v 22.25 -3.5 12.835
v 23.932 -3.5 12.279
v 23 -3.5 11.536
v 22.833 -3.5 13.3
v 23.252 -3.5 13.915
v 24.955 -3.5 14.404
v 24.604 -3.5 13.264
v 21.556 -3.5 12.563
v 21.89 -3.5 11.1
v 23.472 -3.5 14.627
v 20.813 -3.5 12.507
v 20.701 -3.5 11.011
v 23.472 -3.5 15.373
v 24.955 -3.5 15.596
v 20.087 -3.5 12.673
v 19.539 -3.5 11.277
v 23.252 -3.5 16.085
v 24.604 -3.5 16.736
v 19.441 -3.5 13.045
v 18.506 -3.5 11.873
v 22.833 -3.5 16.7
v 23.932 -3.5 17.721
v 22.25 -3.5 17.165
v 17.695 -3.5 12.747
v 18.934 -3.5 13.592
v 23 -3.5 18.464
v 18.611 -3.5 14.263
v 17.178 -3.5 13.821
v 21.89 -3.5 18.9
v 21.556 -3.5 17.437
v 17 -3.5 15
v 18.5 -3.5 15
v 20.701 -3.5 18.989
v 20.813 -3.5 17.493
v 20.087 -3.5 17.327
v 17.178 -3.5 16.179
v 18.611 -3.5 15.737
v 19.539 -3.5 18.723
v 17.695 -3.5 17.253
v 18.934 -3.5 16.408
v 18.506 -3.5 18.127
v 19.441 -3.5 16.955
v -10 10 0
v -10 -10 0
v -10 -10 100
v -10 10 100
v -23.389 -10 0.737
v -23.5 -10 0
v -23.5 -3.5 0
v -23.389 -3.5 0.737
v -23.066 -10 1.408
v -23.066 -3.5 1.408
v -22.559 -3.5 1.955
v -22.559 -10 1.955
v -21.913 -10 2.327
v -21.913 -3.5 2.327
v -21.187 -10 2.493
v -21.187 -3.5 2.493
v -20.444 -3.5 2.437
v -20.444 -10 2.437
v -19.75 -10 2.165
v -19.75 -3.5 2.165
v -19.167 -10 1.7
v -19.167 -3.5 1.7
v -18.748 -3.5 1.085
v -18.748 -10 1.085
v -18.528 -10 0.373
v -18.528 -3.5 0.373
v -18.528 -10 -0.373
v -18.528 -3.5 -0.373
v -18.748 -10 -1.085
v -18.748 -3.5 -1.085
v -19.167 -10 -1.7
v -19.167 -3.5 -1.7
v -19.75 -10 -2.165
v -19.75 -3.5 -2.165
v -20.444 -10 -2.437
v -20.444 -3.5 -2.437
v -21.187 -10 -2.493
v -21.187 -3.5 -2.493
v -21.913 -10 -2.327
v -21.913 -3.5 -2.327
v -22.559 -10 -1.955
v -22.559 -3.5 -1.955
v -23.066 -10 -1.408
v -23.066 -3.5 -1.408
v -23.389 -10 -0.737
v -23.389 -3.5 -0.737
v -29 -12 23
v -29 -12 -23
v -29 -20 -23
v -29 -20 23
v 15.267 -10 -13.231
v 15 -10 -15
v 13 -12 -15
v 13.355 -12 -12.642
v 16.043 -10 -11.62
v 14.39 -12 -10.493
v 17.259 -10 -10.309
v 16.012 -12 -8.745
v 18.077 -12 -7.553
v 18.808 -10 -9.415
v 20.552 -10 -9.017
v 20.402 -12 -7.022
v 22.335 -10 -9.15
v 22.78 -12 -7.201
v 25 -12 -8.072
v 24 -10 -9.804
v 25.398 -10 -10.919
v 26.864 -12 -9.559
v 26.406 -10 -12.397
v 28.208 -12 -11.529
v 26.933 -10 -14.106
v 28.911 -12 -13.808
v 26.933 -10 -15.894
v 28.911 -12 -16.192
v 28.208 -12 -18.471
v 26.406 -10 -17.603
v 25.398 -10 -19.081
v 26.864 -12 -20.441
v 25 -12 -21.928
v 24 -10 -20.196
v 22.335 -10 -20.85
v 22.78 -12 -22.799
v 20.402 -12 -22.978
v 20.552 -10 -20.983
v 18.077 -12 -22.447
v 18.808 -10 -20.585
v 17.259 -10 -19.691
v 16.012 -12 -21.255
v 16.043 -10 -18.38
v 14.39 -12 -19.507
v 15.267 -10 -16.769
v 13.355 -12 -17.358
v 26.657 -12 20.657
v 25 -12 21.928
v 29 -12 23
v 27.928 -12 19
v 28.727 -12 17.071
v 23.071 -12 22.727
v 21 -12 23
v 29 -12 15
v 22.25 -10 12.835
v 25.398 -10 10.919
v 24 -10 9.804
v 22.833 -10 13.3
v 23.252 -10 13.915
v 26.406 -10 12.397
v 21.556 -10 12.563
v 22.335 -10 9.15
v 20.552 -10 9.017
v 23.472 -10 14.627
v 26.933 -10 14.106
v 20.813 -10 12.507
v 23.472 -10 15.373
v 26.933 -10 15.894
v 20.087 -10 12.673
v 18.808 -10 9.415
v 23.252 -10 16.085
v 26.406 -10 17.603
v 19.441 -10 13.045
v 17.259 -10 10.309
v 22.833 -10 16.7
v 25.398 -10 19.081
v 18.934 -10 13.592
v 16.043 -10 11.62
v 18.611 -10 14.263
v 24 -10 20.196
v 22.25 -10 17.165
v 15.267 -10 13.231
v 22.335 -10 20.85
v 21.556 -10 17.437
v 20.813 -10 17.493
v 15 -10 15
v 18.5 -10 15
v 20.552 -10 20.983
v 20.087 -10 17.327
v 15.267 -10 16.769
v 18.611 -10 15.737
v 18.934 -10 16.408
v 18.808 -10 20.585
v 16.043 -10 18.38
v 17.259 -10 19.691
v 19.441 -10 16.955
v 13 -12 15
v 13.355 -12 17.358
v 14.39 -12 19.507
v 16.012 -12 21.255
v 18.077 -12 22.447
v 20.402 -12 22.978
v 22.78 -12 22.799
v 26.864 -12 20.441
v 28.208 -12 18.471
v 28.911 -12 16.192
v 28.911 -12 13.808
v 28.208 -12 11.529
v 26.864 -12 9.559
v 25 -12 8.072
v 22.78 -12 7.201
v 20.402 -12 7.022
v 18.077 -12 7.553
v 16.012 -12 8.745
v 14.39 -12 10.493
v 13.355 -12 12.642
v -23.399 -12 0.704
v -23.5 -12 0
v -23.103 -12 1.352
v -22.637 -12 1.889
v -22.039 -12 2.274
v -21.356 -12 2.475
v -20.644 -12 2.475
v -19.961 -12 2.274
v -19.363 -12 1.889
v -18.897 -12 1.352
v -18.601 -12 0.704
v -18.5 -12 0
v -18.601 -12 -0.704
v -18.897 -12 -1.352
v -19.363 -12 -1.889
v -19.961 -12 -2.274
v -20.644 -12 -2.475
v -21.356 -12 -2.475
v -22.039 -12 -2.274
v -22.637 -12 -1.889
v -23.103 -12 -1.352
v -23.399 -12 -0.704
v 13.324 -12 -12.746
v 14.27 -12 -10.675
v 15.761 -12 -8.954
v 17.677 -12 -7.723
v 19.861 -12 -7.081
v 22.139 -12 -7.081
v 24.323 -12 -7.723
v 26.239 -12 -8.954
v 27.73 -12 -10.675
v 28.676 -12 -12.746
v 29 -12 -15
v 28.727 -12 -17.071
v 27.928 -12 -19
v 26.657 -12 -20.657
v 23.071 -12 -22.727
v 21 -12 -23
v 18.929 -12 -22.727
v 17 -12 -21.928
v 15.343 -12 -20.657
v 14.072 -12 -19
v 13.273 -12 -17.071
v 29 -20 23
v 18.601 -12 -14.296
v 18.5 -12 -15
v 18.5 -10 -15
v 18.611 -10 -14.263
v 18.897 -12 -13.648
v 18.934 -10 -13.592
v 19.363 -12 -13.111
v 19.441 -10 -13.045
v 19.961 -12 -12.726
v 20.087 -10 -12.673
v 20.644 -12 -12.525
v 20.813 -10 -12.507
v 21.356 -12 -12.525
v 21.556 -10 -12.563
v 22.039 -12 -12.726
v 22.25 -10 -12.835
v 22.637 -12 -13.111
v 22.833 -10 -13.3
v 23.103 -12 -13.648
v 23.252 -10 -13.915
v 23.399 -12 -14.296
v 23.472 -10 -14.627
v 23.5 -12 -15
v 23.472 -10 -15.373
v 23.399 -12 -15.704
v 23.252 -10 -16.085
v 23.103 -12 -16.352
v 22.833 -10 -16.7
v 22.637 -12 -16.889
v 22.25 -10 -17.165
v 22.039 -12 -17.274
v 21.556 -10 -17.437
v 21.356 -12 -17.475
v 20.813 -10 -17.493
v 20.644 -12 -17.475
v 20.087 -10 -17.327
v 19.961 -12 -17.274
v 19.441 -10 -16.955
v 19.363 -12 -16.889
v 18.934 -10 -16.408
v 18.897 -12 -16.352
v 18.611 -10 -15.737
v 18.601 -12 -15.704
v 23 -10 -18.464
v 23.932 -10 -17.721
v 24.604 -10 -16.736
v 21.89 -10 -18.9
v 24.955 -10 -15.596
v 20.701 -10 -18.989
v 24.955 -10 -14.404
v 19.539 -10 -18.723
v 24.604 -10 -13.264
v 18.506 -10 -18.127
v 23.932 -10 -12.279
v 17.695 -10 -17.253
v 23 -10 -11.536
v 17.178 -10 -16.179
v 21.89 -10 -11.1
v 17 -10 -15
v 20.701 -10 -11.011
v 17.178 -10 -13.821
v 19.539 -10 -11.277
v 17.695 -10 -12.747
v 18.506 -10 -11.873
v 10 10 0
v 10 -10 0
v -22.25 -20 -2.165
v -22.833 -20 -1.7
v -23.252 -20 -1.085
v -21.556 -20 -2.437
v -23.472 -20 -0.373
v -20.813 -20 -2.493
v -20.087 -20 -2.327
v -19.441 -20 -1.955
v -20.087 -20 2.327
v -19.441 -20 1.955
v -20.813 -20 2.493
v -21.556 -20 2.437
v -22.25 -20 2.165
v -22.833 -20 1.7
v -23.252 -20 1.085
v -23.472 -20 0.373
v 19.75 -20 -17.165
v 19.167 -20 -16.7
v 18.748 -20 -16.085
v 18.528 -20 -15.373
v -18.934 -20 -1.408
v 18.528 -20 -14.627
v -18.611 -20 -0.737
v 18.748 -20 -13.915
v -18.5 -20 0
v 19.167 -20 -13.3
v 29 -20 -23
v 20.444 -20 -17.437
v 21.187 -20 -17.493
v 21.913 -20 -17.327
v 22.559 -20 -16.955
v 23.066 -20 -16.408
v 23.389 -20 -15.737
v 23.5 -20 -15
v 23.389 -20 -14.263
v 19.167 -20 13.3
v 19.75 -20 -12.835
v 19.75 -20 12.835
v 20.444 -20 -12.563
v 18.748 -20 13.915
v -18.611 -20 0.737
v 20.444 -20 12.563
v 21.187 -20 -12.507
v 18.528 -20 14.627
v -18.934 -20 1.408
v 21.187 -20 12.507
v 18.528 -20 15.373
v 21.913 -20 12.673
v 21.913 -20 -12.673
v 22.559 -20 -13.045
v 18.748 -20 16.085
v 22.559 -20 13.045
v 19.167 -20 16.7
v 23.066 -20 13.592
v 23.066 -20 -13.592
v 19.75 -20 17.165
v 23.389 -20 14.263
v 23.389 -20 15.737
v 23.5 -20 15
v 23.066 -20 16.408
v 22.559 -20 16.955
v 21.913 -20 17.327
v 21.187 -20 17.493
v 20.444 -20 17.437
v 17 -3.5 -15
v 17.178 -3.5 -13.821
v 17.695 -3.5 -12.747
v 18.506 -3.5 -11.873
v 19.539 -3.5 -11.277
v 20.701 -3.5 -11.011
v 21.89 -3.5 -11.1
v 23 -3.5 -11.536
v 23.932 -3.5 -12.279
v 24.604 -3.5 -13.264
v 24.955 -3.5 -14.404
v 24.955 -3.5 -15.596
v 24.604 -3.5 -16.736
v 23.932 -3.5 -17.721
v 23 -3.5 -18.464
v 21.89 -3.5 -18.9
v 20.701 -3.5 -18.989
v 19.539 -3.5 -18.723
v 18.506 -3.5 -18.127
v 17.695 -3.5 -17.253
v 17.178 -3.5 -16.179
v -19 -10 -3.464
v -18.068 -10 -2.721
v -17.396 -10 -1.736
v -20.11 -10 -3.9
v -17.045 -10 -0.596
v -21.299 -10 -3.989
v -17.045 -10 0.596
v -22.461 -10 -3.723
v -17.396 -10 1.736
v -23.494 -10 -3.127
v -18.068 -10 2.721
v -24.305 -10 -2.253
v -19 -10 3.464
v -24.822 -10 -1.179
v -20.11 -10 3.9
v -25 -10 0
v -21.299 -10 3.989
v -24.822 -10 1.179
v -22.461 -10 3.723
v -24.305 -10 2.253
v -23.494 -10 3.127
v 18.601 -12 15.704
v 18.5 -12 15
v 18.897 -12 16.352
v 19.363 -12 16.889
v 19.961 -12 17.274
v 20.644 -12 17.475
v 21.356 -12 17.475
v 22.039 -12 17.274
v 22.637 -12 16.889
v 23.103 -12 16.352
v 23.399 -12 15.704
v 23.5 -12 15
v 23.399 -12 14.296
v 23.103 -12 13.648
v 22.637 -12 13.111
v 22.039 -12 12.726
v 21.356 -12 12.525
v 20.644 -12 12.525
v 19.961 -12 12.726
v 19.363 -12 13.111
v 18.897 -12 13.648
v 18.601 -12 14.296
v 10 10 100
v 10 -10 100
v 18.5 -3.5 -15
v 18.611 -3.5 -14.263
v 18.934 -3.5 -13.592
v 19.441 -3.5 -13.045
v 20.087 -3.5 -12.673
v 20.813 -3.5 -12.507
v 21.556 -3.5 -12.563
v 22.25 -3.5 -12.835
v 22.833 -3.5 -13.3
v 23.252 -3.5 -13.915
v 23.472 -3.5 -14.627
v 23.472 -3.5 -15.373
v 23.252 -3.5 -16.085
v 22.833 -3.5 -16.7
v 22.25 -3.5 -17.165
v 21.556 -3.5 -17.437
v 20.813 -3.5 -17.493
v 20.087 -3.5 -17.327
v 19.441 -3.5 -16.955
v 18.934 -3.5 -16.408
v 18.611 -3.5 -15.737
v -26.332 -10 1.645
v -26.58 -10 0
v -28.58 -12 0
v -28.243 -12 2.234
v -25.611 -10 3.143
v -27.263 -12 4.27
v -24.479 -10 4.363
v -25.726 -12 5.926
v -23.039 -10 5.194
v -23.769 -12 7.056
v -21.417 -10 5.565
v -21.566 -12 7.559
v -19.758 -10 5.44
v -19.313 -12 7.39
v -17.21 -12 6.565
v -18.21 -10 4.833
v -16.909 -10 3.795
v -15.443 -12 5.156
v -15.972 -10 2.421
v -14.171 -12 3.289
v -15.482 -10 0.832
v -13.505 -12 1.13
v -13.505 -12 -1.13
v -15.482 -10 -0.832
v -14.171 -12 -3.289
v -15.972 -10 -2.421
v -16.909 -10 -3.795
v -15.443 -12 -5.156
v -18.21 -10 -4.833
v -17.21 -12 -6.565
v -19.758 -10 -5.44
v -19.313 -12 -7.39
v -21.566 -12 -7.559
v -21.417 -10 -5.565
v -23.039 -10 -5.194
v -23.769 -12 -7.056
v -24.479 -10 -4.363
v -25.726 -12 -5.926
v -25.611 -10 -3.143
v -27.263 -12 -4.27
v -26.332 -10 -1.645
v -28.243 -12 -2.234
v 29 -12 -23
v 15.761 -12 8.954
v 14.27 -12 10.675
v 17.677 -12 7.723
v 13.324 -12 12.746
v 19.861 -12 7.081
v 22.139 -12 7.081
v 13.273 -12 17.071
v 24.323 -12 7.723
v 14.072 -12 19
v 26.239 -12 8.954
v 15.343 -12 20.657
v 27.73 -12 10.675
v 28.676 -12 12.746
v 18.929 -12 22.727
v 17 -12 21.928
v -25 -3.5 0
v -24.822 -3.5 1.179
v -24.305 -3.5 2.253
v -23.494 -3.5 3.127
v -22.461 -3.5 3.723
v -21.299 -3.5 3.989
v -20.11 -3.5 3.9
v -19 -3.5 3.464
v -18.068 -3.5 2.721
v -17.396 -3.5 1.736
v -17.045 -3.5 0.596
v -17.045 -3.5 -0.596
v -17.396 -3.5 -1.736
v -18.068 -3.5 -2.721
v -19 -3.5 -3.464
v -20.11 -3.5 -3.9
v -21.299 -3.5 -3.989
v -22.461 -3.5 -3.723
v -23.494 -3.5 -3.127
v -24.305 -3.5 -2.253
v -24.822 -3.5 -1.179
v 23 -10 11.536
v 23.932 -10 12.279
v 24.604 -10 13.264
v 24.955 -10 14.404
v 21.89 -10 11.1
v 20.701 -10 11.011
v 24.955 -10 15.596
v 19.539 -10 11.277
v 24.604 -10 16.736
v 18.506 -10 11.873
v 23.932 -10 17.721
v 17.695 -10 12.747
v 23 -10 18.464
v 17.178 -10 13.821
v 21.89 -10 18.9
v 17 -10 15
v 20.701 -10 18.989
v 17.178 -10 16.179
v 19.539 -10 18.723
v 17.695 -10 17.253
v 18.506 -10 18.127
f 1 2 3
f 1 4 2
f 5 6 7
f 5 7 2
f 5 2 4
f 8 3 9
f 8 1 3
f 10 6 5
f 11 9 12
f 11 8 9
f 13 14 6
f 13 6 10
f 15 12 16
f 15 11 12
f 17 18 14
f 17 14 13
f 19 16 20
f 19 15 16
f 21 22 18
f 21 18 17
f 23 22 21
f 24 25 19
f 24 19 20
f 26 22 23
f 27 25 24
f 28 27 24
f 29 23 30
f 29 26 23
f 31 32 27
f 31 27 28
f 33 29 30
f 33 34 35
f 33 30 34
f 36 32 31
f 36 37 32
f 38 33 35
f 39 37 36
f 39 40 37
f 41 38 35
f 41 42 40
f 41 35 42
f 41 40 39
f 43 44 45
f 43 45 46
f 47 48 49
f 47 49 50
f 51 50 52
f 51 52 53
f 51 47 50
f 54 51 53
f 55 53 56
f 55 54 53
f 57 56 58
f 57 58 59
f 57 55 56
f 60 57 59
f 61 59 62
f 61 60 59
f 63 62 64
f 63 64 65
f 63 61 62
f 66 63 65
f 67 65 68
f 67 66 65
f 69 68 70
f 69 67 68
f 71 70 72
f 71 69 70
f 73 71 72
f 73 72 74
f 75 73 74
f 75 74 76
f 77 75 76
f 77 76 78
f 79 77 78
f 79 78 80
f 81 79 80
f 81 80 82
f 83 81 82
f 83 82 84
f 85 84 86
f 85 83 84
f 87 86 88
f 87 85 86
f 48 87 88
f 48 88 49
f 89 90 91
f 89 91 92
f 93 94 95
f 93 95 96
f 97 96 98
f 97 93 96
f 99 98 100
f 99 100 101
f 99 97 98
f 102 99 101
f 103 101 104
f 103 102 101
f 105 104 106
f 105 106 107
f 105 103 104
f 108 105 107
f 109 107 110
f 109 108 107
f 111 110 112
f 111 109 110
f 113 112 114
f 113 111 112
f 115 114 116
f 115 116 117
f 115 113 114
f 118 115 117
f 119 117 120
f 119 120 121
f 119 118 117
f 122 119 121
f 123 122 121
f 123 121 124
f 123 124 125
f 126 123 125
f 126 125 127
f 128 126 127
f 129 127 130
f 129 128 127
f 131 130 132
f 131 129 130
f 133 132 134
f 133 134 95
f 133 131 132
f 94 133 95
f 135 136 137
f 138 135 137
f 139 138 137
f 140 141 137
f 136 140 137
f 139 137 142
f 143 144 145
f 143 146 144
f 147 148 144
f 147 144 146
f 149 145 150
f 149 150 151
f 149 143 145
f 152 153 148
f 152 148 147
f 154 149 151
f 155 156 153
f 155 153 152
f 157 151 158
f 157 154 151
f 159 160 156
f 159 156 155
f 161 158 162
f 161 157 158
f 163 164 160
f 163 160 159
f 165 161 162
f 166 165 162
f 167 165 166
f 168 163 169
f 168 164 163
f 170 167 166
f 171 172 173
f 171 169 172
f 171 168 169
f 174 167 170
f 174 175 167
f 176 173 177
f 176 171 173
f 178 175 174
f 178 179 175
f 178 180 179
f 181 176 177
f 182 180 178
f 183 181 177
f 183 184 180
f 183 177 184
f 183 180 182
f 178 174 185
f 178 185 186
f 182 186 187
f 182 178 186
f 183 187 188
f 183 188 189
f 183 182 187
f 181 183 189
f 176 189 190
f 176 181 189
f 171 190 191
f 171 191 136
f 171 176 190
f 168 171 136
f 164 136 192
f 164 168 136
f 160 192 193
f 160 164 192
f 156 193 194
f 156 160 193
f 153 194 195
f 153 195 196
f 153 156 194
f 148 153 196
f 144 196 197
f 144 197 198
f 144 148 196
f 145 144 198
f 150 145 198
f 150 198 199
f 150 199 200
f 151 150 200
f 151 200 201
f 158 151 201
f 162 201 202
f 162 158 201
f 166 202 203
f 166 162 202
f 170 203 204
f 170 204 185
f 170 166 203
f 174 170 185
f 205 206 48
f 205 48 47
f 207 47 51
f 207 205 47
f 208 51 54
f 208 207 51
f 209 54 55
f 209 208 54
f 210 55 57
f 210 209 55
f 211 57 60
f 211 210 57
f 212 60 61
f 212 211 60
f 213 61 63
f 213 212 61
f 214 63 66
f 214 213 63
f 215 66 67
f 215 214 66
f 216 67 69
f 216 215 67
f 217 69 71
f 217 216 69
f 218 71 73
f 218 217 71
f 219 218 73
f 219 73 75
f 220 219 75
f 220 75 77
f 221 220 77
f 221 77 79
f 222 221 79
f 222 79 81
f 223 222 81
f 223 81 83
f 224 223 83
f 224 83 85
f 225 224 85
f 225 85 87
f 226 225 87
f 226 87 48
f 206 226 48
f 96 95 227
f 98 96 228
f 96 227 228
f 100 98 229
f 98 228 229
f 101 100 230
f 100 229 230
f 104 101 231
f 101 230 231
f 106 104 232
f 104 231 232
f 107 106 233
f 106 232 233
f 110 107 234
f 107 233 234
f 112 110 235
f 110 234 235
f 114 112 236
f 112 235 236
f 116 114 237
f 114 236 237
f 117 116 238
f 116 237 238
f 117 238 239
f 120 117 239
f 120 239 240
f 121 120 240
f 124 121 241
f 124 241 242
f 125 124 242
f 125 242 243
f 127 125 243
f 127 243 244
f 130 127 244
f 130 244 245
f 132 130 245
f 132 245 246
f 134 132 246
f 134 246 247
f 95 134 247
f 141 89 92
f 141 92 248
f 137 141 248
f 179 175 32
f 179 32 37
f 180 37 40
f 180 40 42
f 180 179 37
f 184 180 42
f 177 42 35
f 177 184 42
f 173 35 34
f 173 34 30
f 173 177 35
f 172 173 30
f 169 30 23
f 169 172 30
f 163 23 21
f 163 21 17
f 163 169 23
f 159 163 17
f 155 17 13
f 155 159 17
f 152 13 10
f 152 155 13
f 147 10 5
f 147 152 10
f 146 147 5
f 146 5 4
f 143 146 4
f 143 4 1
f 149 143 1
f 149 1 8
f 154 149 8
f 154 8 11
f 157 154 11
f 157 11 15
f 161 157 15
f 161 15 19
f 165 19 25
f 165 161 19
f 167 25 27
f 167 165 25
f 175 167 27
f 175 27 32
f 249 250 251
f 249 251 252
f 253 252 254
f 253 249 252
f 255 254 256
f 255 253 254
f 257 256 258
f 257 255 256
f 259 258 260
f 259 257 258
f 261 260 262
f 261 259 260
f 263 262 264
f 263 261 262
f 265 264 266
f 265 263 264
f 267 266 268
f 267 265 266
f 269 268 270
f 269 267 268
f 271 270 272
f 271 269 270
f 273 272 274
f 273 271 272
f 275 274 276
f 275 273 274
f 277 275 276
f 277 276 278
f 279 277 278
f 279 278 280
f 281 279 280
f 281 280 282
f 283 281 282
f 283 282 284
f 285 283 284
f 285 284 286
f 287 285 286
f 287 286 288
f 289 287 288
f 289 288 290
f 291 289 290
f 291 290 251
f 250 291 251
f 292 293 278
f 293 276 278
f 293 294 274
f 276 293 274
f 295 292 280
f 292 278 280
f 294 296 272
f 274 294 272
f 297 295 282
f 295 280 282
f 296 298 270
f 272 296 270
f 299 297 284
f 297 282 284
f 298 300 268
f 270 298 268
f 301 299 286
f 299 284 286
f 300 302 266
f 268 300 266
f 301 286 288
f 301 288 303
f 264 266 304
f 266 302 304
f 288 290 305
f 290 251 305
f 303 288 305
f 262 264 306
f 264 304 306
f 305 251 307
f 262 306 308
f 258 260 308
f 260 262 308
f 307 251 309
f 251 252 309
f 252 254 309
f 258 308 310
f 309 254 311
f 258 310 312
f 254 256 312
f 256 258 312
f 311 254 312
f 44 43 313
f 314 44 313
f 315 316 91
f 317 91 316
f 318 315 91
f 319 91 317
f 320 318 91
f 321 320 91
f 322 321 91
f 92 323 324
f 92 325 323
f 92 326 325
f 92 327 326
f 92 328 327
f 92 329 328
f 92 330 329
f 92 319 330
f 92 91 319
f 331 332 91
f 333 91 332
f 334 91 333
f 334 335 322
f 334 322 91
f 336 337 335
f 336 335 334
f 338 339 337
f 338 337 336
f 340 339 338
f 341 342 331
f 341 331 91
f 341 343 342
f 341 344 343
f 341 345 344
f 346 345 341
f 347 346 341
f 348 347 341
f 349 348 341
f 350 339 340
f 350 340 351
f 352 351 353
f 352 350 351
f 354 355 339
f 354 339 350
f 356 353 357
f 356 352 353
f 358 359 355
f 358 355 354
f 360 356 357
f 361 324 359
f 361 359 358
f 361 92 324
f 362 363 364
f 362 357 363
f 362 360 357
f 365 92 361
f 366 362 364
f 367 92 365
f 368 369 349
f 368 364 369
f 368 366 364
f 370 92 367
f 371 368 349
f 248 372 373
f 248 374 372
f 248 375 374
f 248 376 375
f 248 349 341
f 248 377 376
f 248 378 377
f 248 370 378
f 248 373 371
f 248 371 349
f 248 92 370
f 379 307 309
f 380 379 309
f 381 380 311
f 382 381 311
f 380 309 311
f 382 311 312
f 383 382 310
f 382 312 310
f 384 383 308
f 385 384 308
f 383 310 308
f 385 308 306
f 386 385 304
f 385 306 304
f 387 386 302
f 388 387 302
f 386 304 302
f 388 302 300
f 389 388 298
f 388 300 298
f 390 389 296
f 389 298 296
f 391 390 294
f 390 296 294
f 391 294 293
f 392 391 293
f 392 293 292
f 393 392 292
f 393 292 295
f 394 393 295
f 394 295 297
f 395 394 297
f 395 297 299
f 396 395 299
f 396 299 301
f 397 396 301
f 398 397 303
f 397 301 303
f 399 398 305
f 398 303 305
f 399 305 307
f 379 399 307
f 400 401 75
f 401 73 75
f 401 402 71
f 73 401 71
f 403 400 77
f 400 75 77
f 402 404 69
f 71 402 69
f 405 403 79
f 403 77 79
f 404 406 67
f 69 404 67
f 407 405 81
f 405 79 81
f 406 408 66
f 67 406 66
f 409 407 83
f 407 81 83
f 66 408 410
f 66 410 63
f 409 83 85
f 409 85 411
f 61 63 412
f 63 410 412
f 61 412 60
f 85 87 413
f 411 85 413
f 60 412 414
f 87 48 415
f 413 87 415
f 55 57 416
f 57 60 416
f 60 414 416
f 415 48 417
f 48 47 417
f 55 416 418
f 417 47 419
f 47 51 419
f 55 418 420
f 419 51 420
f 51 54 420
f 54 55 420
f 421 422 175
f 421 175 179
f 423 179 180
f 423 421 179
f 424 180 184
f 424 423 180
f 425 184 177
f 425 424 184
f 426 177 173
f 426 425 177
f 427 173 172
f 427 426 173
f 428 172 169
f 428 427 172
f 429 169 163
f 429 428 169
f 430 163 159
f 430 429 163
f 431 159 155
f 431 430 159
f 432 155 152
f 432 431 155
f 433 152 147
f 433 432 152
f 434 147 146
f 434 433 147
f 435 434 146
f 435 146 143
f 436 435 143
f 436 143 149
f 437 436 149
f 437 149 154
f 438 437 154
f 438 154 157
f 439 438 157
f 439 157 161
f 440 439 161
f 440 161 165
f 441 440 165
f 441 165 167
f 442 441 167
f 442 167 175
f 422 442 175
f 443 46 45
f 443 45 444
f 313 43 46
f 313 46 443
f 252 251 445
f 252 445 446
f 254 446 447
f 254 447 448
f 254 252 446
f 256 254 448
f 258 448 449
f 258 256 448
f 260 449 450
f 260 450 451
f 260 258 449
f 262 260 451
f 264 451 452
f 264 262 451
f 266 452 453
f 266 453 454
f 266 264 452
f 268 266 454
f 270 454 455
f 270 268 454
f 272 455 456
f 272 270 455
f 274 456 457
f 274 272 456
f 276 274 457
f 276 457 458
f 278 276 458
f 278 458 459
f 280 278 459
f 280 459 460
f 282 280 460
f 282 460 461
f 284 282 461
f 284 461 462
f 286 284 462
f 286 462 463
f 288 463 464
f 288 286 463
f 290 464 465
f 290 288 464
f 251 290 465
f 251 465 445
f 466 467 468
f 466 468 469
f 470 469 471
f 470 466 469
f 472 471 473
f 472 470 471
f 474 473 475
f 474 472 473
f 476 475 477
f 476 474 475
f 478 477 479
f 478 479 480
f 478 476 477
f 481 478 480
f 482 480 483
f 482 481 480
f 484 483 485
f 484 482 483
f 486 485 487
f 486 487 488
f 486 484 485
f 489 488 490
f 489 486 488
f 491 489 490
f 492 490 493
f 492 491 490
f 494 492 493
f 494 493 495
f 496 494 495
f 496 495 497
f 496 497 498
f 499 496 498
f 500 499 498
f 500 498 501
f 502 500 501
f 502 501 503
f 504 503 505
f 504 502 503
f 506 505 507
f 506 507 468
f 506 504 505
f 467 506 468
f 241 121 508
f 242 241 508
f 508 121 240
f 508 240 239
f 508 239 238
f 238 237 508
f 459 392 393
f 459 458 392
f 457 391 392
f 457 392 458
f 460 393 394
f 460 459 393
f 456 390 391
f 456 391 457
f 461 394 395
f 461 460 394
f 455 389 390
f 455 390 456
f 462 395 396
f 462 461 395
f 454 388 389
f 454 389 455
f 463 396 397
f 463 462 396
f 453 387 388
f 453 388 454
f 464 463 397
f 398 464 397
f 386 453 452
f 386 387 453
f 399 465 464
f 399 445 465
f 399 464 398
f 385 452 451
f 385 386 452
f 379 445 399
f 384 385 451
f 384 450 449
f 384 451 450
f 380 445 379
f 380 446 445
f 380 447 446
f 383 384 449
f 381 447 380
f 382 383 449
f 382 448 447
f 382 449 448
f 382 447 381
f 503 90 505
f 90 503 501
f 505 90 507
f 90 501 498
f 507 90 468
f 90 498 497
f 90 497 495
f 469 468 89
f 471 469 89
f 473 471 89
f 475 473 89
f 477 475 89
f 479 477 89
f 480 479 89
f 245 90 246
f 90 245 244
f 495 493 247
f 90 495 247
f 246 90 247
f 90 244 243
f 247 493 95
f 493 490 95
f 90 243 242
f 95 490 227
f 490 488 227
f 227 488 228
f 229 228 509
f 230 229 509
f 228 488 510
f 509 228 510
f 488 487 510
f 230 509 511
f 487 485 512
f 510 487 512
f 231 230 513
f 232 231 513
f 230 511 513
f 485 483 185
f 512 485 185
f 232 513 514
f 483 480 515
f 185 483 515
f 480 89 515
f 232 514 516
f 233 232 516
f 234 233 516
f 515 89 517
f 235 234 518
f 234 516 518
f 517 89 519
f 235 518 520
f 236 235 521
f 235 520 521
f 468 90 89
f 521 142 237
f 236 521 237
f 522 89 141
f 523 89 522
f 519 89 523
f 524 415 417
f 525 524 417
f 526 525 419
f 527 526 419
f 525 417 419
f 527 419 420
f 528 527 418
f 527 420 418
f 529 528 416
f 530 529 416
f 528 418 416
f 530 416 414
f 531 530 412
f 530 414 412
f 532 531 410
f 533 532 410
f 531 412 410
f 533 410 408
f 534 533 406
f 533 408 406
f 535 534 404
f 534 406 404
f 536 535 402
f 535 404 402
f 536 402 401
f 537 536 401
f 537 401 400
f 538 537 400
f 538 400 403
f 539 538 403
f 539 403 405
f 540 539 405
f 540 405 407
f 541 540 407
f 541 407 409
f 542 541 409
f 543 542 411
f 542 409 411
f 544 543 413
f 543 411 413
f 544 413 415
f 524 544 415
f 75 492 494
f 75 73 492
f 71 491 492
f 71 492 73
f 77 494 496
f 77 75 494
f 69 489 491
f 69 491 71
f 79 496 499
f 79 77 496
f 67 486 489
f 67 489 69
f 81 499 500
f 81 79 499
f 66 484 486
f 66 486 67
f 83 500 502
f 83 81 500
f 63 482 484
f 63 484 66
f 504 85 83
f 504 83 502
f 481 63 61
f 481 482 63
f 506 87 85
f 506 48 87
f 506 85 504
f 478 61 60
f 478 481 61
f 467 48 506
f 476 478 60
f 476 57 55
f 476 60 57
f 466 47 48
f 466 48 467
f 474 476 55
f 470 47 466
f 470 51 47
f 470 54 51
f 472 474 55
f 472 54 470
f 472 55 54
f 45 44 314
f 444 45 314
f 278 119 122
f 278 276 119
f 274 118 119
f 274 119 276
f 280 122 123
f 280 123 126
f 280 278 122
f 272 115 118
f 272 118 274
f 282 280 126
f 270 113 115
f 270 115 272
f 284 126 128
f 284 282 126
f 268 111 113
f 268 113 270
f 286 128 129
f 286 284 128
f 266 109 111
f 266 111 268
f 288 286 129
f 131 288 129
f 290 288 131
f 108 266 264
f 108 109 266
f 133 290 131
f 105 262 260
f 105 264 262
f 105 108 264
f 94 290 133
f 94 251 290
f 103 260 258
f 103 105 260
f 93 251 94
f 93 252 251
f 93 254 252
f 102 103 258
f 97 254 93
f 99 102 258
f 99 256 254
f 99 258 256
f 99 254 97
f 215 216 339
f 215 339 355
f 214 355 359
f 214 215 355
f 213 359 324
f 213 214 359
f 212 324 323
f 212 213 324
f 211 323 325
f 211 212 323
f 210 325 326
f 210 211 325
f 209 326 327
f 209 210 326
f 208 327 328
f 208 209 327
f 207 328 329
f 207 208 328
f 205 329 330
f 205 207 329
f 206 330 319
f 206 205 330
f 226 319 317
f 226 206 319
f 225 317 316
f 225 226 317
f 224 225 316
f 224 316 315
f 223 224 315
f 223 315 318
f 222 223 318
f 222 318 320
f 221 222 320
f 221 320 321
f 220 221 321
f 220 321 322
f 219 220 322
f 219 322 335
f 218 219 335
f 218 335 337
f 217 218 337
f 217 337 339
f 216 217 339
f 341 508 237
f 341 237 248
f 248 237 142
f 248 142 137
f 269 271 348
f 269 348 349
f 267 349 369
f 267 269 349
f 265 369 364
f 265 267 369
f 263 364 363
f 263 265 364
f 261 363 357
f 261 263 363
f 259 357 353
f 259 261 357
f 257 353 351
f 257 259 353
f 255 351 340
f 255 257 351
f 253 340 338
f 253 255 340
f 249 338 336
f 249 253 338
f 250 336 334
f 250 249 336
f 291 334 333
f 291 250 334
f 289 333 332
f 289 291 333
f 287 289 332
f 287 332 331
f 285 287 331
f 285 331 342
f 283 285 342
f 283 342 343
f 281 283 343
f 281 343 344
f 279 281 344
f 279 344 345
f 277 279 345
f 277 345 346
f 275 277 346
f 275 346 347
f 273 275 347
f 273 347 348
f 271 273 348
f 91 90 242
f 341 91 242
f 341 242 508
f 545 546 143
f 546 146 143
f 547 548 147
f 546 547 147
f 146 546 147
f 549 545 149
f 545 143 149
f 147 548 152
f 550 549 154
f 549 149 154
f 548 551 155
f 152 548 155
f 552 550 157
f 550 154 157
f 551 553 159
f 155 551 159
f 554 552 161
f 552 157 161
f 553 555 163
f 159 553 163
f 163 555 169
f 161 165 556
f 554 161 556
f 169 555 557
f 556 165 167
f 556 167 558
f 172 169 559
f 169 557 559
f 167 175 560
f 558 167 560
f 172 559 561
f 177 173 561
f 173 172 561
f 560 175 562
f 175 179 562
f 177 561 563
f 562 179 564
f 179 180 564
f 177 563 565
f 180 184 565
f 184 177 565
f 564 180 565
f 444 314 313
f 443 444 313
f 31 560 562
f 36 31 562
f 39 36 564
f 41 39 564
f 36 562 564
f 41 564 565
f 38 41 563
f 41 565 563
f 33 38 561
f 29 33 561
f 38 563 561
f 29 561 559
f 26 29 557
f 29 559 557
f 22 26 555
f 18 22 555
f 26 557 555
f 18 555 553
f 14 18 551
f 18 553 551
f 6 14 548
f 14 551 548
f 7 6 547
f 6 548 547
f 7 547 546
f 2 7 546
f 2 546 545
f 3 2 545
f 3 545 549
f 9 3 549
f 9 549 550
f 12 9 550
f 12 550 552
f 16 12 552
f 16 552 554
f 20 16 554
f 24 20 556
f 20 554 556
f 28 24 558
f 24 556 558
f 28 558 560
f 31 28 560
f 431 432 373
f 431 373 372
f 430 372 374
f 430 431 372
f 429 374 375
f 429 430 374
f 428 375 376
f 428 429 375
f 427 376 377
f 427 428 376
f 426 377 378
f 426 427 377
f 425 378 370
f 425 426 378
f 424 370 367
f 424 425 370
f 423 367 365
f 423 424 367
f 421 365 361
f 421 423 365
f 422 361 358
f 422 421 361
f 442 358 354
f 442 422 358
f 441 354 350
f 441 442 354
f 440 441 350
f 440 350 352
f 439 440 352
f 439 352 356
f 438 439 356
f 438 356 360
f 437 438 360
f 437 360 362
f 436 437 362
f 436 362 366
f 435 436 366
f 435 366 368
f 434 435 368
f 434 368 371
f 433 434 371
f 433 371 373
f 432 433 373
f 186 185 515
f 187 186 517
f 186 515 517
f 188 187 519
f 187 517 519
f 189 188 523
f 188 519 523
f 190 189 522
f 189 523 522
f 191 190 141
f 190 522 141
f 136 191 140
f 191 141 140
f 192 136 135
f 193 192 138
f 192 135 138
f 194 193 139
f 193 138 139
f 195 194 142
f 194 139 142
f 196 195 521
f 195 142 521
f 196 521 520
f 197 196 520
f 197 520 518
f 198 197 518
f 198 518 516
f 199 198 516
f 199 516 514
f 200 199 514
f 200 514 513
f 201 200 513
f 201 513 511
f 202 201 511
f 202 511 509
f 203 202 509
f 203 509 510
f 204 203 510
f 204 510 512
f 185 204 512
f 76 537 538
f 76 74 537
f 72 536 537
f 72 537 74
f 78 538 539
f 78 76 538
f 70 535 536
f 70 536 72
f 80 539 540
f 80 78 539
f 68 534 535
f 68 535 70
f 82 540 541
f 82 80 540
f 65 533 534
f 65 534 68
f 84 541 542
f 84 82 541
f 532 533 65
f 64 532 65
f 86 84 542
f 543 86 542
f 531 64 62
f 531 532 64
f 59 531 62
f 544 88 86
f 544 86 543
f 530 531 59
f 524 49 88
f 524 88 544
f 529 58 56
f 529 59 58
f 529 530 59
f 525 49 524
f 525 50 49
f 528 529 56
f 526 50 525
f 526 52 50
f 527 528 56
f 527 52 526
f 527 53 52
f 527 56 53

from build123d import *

# Parameters (mm, degrees)
F1_W     = 20
F1_H     = 20
F2_DEPTH = 100
F3_W     = 58
F3_H     = 46
F3_R     = 2.5
F4_DEPTH = 8
F5_R     = 8
F5_R_2   = 2.5
F5_R_3   = 7.5801298939
F6_DEPTH = 2
F7_SIZE  = 1.99999
F8_R     = 4
F8_R_2   = 2.5
F9_DEPTH = 6.5


# Not quite as in the source:
# - a fillet or chamfer is up to 0.001 mm smaller than in the source, because OpenCascade refuses the exact size


with BuildPart() as f2:
    # F1 (on Top) → F2 (new body)
    with BuildSketch(Plane.XY):
        Rectangle(F1_W, F1_H)
    extrude(amount=F2_DEPTH)


with BuildPart() as f4:
    # F3 (on offset) → F4 (new body)
    with BuildSketch(Plane.XZ.offset(12)):
        Rectangle(F3_W, F3_H)
        with Locations((21, -15)):
            Circle(F3_R, mode=Mode.SUBTRACT)
        with Locations((-21, 0)):
            Circle(F3_R, mode=Mode.SUBTRACT)
        with Locations((21, 15)):
            Circle(F3_R, mode=Mode.SUBTRACT)
    extrude(amount=F4_DEPTH)

    # F5 (on face) → F6 (join)
    with BuildSketch(Plane(origin=(0, -12, 0), x_dir=(-1, 0, 0), z_dir=(0, 1, 0))):
        with Locations((-21, 15)):
            Circle(F5_R)
        with Locations((-21, 15)):
            Circle(F5_R_2, mode=Mode.SUBTRACT)
        with Locations((-21, -15)):
            Circle(F5_R)
        with Locations((-21, -15)):
            Circle(F5_R_2, mode=Mode.SUBTRACT)
        with Locations((21, 0)):
            Circle(F5_R_3)
        with Locations((21, 0)):
            Circle(F5_R_2, mode=Mode.SUBTRACT)
    extrude(amount=F6_DEPTH)

    # F7 (size 2 in the source; OpenCascade refuses exactly that, so slightly less here)
    f7_edges = [f4.edges().sort_by_distance(p)[0] for p in [
        (29, -10, 15),
        (-13.41987, -10, 0),
        (29, -10, -15),
    ]]
    chamfer(f7_edges, length=F7_SIZE)


with BuildPart() as f9:
    # F8 (on face) → F9 (new body)
    with BuildSketch(Plane(origin=(0, -10, 0), x_dir=(-1, 0, 0), z_dir=(0, 1, 0))):
        with Locations((-21, 15)):
            Circle(F8_R)
        with Locations((-21, 15)):
            Circle(F8_R_2, mode=Mode.SUBTRACT)
    extrude(amount=F9_DEPTH)


with BuildPart() as f9b:
    # F8 (on face) → F9, piece 2 (new body)
    with BuildSketch(Plane(origin=(0, -10, 0), x_dir=(-1, 0, 0), z_dir=(0, 1, 0))):
        with Locations((21, 0)):
            Circle(F8_R)
        with Locations((21, 0)):
            Circle(F8_R_2, mode=Mode.SUBTRACT)
    extrude(amount=F9_DEPTH)


with BuildPart() as f9c:
    # F8 (on face) → F9, piece 3 (new body)
    with BuildSketch(Plane(origin=(0, -10, 0), x_dir=(-1, 0, 0), z_dir=(0, 1, 0))):
        with Locations((-21, -15)):
            Circle(F8_R)
        with Locations((-21, -15)):
            Circle(F8_R_2, mode=Mode.SUBTRACT)
    extrude(amount=F9_DEPTH)


solid = Compound([f2.part, f4.part, f9.part, f9b.part, f9c.part])
